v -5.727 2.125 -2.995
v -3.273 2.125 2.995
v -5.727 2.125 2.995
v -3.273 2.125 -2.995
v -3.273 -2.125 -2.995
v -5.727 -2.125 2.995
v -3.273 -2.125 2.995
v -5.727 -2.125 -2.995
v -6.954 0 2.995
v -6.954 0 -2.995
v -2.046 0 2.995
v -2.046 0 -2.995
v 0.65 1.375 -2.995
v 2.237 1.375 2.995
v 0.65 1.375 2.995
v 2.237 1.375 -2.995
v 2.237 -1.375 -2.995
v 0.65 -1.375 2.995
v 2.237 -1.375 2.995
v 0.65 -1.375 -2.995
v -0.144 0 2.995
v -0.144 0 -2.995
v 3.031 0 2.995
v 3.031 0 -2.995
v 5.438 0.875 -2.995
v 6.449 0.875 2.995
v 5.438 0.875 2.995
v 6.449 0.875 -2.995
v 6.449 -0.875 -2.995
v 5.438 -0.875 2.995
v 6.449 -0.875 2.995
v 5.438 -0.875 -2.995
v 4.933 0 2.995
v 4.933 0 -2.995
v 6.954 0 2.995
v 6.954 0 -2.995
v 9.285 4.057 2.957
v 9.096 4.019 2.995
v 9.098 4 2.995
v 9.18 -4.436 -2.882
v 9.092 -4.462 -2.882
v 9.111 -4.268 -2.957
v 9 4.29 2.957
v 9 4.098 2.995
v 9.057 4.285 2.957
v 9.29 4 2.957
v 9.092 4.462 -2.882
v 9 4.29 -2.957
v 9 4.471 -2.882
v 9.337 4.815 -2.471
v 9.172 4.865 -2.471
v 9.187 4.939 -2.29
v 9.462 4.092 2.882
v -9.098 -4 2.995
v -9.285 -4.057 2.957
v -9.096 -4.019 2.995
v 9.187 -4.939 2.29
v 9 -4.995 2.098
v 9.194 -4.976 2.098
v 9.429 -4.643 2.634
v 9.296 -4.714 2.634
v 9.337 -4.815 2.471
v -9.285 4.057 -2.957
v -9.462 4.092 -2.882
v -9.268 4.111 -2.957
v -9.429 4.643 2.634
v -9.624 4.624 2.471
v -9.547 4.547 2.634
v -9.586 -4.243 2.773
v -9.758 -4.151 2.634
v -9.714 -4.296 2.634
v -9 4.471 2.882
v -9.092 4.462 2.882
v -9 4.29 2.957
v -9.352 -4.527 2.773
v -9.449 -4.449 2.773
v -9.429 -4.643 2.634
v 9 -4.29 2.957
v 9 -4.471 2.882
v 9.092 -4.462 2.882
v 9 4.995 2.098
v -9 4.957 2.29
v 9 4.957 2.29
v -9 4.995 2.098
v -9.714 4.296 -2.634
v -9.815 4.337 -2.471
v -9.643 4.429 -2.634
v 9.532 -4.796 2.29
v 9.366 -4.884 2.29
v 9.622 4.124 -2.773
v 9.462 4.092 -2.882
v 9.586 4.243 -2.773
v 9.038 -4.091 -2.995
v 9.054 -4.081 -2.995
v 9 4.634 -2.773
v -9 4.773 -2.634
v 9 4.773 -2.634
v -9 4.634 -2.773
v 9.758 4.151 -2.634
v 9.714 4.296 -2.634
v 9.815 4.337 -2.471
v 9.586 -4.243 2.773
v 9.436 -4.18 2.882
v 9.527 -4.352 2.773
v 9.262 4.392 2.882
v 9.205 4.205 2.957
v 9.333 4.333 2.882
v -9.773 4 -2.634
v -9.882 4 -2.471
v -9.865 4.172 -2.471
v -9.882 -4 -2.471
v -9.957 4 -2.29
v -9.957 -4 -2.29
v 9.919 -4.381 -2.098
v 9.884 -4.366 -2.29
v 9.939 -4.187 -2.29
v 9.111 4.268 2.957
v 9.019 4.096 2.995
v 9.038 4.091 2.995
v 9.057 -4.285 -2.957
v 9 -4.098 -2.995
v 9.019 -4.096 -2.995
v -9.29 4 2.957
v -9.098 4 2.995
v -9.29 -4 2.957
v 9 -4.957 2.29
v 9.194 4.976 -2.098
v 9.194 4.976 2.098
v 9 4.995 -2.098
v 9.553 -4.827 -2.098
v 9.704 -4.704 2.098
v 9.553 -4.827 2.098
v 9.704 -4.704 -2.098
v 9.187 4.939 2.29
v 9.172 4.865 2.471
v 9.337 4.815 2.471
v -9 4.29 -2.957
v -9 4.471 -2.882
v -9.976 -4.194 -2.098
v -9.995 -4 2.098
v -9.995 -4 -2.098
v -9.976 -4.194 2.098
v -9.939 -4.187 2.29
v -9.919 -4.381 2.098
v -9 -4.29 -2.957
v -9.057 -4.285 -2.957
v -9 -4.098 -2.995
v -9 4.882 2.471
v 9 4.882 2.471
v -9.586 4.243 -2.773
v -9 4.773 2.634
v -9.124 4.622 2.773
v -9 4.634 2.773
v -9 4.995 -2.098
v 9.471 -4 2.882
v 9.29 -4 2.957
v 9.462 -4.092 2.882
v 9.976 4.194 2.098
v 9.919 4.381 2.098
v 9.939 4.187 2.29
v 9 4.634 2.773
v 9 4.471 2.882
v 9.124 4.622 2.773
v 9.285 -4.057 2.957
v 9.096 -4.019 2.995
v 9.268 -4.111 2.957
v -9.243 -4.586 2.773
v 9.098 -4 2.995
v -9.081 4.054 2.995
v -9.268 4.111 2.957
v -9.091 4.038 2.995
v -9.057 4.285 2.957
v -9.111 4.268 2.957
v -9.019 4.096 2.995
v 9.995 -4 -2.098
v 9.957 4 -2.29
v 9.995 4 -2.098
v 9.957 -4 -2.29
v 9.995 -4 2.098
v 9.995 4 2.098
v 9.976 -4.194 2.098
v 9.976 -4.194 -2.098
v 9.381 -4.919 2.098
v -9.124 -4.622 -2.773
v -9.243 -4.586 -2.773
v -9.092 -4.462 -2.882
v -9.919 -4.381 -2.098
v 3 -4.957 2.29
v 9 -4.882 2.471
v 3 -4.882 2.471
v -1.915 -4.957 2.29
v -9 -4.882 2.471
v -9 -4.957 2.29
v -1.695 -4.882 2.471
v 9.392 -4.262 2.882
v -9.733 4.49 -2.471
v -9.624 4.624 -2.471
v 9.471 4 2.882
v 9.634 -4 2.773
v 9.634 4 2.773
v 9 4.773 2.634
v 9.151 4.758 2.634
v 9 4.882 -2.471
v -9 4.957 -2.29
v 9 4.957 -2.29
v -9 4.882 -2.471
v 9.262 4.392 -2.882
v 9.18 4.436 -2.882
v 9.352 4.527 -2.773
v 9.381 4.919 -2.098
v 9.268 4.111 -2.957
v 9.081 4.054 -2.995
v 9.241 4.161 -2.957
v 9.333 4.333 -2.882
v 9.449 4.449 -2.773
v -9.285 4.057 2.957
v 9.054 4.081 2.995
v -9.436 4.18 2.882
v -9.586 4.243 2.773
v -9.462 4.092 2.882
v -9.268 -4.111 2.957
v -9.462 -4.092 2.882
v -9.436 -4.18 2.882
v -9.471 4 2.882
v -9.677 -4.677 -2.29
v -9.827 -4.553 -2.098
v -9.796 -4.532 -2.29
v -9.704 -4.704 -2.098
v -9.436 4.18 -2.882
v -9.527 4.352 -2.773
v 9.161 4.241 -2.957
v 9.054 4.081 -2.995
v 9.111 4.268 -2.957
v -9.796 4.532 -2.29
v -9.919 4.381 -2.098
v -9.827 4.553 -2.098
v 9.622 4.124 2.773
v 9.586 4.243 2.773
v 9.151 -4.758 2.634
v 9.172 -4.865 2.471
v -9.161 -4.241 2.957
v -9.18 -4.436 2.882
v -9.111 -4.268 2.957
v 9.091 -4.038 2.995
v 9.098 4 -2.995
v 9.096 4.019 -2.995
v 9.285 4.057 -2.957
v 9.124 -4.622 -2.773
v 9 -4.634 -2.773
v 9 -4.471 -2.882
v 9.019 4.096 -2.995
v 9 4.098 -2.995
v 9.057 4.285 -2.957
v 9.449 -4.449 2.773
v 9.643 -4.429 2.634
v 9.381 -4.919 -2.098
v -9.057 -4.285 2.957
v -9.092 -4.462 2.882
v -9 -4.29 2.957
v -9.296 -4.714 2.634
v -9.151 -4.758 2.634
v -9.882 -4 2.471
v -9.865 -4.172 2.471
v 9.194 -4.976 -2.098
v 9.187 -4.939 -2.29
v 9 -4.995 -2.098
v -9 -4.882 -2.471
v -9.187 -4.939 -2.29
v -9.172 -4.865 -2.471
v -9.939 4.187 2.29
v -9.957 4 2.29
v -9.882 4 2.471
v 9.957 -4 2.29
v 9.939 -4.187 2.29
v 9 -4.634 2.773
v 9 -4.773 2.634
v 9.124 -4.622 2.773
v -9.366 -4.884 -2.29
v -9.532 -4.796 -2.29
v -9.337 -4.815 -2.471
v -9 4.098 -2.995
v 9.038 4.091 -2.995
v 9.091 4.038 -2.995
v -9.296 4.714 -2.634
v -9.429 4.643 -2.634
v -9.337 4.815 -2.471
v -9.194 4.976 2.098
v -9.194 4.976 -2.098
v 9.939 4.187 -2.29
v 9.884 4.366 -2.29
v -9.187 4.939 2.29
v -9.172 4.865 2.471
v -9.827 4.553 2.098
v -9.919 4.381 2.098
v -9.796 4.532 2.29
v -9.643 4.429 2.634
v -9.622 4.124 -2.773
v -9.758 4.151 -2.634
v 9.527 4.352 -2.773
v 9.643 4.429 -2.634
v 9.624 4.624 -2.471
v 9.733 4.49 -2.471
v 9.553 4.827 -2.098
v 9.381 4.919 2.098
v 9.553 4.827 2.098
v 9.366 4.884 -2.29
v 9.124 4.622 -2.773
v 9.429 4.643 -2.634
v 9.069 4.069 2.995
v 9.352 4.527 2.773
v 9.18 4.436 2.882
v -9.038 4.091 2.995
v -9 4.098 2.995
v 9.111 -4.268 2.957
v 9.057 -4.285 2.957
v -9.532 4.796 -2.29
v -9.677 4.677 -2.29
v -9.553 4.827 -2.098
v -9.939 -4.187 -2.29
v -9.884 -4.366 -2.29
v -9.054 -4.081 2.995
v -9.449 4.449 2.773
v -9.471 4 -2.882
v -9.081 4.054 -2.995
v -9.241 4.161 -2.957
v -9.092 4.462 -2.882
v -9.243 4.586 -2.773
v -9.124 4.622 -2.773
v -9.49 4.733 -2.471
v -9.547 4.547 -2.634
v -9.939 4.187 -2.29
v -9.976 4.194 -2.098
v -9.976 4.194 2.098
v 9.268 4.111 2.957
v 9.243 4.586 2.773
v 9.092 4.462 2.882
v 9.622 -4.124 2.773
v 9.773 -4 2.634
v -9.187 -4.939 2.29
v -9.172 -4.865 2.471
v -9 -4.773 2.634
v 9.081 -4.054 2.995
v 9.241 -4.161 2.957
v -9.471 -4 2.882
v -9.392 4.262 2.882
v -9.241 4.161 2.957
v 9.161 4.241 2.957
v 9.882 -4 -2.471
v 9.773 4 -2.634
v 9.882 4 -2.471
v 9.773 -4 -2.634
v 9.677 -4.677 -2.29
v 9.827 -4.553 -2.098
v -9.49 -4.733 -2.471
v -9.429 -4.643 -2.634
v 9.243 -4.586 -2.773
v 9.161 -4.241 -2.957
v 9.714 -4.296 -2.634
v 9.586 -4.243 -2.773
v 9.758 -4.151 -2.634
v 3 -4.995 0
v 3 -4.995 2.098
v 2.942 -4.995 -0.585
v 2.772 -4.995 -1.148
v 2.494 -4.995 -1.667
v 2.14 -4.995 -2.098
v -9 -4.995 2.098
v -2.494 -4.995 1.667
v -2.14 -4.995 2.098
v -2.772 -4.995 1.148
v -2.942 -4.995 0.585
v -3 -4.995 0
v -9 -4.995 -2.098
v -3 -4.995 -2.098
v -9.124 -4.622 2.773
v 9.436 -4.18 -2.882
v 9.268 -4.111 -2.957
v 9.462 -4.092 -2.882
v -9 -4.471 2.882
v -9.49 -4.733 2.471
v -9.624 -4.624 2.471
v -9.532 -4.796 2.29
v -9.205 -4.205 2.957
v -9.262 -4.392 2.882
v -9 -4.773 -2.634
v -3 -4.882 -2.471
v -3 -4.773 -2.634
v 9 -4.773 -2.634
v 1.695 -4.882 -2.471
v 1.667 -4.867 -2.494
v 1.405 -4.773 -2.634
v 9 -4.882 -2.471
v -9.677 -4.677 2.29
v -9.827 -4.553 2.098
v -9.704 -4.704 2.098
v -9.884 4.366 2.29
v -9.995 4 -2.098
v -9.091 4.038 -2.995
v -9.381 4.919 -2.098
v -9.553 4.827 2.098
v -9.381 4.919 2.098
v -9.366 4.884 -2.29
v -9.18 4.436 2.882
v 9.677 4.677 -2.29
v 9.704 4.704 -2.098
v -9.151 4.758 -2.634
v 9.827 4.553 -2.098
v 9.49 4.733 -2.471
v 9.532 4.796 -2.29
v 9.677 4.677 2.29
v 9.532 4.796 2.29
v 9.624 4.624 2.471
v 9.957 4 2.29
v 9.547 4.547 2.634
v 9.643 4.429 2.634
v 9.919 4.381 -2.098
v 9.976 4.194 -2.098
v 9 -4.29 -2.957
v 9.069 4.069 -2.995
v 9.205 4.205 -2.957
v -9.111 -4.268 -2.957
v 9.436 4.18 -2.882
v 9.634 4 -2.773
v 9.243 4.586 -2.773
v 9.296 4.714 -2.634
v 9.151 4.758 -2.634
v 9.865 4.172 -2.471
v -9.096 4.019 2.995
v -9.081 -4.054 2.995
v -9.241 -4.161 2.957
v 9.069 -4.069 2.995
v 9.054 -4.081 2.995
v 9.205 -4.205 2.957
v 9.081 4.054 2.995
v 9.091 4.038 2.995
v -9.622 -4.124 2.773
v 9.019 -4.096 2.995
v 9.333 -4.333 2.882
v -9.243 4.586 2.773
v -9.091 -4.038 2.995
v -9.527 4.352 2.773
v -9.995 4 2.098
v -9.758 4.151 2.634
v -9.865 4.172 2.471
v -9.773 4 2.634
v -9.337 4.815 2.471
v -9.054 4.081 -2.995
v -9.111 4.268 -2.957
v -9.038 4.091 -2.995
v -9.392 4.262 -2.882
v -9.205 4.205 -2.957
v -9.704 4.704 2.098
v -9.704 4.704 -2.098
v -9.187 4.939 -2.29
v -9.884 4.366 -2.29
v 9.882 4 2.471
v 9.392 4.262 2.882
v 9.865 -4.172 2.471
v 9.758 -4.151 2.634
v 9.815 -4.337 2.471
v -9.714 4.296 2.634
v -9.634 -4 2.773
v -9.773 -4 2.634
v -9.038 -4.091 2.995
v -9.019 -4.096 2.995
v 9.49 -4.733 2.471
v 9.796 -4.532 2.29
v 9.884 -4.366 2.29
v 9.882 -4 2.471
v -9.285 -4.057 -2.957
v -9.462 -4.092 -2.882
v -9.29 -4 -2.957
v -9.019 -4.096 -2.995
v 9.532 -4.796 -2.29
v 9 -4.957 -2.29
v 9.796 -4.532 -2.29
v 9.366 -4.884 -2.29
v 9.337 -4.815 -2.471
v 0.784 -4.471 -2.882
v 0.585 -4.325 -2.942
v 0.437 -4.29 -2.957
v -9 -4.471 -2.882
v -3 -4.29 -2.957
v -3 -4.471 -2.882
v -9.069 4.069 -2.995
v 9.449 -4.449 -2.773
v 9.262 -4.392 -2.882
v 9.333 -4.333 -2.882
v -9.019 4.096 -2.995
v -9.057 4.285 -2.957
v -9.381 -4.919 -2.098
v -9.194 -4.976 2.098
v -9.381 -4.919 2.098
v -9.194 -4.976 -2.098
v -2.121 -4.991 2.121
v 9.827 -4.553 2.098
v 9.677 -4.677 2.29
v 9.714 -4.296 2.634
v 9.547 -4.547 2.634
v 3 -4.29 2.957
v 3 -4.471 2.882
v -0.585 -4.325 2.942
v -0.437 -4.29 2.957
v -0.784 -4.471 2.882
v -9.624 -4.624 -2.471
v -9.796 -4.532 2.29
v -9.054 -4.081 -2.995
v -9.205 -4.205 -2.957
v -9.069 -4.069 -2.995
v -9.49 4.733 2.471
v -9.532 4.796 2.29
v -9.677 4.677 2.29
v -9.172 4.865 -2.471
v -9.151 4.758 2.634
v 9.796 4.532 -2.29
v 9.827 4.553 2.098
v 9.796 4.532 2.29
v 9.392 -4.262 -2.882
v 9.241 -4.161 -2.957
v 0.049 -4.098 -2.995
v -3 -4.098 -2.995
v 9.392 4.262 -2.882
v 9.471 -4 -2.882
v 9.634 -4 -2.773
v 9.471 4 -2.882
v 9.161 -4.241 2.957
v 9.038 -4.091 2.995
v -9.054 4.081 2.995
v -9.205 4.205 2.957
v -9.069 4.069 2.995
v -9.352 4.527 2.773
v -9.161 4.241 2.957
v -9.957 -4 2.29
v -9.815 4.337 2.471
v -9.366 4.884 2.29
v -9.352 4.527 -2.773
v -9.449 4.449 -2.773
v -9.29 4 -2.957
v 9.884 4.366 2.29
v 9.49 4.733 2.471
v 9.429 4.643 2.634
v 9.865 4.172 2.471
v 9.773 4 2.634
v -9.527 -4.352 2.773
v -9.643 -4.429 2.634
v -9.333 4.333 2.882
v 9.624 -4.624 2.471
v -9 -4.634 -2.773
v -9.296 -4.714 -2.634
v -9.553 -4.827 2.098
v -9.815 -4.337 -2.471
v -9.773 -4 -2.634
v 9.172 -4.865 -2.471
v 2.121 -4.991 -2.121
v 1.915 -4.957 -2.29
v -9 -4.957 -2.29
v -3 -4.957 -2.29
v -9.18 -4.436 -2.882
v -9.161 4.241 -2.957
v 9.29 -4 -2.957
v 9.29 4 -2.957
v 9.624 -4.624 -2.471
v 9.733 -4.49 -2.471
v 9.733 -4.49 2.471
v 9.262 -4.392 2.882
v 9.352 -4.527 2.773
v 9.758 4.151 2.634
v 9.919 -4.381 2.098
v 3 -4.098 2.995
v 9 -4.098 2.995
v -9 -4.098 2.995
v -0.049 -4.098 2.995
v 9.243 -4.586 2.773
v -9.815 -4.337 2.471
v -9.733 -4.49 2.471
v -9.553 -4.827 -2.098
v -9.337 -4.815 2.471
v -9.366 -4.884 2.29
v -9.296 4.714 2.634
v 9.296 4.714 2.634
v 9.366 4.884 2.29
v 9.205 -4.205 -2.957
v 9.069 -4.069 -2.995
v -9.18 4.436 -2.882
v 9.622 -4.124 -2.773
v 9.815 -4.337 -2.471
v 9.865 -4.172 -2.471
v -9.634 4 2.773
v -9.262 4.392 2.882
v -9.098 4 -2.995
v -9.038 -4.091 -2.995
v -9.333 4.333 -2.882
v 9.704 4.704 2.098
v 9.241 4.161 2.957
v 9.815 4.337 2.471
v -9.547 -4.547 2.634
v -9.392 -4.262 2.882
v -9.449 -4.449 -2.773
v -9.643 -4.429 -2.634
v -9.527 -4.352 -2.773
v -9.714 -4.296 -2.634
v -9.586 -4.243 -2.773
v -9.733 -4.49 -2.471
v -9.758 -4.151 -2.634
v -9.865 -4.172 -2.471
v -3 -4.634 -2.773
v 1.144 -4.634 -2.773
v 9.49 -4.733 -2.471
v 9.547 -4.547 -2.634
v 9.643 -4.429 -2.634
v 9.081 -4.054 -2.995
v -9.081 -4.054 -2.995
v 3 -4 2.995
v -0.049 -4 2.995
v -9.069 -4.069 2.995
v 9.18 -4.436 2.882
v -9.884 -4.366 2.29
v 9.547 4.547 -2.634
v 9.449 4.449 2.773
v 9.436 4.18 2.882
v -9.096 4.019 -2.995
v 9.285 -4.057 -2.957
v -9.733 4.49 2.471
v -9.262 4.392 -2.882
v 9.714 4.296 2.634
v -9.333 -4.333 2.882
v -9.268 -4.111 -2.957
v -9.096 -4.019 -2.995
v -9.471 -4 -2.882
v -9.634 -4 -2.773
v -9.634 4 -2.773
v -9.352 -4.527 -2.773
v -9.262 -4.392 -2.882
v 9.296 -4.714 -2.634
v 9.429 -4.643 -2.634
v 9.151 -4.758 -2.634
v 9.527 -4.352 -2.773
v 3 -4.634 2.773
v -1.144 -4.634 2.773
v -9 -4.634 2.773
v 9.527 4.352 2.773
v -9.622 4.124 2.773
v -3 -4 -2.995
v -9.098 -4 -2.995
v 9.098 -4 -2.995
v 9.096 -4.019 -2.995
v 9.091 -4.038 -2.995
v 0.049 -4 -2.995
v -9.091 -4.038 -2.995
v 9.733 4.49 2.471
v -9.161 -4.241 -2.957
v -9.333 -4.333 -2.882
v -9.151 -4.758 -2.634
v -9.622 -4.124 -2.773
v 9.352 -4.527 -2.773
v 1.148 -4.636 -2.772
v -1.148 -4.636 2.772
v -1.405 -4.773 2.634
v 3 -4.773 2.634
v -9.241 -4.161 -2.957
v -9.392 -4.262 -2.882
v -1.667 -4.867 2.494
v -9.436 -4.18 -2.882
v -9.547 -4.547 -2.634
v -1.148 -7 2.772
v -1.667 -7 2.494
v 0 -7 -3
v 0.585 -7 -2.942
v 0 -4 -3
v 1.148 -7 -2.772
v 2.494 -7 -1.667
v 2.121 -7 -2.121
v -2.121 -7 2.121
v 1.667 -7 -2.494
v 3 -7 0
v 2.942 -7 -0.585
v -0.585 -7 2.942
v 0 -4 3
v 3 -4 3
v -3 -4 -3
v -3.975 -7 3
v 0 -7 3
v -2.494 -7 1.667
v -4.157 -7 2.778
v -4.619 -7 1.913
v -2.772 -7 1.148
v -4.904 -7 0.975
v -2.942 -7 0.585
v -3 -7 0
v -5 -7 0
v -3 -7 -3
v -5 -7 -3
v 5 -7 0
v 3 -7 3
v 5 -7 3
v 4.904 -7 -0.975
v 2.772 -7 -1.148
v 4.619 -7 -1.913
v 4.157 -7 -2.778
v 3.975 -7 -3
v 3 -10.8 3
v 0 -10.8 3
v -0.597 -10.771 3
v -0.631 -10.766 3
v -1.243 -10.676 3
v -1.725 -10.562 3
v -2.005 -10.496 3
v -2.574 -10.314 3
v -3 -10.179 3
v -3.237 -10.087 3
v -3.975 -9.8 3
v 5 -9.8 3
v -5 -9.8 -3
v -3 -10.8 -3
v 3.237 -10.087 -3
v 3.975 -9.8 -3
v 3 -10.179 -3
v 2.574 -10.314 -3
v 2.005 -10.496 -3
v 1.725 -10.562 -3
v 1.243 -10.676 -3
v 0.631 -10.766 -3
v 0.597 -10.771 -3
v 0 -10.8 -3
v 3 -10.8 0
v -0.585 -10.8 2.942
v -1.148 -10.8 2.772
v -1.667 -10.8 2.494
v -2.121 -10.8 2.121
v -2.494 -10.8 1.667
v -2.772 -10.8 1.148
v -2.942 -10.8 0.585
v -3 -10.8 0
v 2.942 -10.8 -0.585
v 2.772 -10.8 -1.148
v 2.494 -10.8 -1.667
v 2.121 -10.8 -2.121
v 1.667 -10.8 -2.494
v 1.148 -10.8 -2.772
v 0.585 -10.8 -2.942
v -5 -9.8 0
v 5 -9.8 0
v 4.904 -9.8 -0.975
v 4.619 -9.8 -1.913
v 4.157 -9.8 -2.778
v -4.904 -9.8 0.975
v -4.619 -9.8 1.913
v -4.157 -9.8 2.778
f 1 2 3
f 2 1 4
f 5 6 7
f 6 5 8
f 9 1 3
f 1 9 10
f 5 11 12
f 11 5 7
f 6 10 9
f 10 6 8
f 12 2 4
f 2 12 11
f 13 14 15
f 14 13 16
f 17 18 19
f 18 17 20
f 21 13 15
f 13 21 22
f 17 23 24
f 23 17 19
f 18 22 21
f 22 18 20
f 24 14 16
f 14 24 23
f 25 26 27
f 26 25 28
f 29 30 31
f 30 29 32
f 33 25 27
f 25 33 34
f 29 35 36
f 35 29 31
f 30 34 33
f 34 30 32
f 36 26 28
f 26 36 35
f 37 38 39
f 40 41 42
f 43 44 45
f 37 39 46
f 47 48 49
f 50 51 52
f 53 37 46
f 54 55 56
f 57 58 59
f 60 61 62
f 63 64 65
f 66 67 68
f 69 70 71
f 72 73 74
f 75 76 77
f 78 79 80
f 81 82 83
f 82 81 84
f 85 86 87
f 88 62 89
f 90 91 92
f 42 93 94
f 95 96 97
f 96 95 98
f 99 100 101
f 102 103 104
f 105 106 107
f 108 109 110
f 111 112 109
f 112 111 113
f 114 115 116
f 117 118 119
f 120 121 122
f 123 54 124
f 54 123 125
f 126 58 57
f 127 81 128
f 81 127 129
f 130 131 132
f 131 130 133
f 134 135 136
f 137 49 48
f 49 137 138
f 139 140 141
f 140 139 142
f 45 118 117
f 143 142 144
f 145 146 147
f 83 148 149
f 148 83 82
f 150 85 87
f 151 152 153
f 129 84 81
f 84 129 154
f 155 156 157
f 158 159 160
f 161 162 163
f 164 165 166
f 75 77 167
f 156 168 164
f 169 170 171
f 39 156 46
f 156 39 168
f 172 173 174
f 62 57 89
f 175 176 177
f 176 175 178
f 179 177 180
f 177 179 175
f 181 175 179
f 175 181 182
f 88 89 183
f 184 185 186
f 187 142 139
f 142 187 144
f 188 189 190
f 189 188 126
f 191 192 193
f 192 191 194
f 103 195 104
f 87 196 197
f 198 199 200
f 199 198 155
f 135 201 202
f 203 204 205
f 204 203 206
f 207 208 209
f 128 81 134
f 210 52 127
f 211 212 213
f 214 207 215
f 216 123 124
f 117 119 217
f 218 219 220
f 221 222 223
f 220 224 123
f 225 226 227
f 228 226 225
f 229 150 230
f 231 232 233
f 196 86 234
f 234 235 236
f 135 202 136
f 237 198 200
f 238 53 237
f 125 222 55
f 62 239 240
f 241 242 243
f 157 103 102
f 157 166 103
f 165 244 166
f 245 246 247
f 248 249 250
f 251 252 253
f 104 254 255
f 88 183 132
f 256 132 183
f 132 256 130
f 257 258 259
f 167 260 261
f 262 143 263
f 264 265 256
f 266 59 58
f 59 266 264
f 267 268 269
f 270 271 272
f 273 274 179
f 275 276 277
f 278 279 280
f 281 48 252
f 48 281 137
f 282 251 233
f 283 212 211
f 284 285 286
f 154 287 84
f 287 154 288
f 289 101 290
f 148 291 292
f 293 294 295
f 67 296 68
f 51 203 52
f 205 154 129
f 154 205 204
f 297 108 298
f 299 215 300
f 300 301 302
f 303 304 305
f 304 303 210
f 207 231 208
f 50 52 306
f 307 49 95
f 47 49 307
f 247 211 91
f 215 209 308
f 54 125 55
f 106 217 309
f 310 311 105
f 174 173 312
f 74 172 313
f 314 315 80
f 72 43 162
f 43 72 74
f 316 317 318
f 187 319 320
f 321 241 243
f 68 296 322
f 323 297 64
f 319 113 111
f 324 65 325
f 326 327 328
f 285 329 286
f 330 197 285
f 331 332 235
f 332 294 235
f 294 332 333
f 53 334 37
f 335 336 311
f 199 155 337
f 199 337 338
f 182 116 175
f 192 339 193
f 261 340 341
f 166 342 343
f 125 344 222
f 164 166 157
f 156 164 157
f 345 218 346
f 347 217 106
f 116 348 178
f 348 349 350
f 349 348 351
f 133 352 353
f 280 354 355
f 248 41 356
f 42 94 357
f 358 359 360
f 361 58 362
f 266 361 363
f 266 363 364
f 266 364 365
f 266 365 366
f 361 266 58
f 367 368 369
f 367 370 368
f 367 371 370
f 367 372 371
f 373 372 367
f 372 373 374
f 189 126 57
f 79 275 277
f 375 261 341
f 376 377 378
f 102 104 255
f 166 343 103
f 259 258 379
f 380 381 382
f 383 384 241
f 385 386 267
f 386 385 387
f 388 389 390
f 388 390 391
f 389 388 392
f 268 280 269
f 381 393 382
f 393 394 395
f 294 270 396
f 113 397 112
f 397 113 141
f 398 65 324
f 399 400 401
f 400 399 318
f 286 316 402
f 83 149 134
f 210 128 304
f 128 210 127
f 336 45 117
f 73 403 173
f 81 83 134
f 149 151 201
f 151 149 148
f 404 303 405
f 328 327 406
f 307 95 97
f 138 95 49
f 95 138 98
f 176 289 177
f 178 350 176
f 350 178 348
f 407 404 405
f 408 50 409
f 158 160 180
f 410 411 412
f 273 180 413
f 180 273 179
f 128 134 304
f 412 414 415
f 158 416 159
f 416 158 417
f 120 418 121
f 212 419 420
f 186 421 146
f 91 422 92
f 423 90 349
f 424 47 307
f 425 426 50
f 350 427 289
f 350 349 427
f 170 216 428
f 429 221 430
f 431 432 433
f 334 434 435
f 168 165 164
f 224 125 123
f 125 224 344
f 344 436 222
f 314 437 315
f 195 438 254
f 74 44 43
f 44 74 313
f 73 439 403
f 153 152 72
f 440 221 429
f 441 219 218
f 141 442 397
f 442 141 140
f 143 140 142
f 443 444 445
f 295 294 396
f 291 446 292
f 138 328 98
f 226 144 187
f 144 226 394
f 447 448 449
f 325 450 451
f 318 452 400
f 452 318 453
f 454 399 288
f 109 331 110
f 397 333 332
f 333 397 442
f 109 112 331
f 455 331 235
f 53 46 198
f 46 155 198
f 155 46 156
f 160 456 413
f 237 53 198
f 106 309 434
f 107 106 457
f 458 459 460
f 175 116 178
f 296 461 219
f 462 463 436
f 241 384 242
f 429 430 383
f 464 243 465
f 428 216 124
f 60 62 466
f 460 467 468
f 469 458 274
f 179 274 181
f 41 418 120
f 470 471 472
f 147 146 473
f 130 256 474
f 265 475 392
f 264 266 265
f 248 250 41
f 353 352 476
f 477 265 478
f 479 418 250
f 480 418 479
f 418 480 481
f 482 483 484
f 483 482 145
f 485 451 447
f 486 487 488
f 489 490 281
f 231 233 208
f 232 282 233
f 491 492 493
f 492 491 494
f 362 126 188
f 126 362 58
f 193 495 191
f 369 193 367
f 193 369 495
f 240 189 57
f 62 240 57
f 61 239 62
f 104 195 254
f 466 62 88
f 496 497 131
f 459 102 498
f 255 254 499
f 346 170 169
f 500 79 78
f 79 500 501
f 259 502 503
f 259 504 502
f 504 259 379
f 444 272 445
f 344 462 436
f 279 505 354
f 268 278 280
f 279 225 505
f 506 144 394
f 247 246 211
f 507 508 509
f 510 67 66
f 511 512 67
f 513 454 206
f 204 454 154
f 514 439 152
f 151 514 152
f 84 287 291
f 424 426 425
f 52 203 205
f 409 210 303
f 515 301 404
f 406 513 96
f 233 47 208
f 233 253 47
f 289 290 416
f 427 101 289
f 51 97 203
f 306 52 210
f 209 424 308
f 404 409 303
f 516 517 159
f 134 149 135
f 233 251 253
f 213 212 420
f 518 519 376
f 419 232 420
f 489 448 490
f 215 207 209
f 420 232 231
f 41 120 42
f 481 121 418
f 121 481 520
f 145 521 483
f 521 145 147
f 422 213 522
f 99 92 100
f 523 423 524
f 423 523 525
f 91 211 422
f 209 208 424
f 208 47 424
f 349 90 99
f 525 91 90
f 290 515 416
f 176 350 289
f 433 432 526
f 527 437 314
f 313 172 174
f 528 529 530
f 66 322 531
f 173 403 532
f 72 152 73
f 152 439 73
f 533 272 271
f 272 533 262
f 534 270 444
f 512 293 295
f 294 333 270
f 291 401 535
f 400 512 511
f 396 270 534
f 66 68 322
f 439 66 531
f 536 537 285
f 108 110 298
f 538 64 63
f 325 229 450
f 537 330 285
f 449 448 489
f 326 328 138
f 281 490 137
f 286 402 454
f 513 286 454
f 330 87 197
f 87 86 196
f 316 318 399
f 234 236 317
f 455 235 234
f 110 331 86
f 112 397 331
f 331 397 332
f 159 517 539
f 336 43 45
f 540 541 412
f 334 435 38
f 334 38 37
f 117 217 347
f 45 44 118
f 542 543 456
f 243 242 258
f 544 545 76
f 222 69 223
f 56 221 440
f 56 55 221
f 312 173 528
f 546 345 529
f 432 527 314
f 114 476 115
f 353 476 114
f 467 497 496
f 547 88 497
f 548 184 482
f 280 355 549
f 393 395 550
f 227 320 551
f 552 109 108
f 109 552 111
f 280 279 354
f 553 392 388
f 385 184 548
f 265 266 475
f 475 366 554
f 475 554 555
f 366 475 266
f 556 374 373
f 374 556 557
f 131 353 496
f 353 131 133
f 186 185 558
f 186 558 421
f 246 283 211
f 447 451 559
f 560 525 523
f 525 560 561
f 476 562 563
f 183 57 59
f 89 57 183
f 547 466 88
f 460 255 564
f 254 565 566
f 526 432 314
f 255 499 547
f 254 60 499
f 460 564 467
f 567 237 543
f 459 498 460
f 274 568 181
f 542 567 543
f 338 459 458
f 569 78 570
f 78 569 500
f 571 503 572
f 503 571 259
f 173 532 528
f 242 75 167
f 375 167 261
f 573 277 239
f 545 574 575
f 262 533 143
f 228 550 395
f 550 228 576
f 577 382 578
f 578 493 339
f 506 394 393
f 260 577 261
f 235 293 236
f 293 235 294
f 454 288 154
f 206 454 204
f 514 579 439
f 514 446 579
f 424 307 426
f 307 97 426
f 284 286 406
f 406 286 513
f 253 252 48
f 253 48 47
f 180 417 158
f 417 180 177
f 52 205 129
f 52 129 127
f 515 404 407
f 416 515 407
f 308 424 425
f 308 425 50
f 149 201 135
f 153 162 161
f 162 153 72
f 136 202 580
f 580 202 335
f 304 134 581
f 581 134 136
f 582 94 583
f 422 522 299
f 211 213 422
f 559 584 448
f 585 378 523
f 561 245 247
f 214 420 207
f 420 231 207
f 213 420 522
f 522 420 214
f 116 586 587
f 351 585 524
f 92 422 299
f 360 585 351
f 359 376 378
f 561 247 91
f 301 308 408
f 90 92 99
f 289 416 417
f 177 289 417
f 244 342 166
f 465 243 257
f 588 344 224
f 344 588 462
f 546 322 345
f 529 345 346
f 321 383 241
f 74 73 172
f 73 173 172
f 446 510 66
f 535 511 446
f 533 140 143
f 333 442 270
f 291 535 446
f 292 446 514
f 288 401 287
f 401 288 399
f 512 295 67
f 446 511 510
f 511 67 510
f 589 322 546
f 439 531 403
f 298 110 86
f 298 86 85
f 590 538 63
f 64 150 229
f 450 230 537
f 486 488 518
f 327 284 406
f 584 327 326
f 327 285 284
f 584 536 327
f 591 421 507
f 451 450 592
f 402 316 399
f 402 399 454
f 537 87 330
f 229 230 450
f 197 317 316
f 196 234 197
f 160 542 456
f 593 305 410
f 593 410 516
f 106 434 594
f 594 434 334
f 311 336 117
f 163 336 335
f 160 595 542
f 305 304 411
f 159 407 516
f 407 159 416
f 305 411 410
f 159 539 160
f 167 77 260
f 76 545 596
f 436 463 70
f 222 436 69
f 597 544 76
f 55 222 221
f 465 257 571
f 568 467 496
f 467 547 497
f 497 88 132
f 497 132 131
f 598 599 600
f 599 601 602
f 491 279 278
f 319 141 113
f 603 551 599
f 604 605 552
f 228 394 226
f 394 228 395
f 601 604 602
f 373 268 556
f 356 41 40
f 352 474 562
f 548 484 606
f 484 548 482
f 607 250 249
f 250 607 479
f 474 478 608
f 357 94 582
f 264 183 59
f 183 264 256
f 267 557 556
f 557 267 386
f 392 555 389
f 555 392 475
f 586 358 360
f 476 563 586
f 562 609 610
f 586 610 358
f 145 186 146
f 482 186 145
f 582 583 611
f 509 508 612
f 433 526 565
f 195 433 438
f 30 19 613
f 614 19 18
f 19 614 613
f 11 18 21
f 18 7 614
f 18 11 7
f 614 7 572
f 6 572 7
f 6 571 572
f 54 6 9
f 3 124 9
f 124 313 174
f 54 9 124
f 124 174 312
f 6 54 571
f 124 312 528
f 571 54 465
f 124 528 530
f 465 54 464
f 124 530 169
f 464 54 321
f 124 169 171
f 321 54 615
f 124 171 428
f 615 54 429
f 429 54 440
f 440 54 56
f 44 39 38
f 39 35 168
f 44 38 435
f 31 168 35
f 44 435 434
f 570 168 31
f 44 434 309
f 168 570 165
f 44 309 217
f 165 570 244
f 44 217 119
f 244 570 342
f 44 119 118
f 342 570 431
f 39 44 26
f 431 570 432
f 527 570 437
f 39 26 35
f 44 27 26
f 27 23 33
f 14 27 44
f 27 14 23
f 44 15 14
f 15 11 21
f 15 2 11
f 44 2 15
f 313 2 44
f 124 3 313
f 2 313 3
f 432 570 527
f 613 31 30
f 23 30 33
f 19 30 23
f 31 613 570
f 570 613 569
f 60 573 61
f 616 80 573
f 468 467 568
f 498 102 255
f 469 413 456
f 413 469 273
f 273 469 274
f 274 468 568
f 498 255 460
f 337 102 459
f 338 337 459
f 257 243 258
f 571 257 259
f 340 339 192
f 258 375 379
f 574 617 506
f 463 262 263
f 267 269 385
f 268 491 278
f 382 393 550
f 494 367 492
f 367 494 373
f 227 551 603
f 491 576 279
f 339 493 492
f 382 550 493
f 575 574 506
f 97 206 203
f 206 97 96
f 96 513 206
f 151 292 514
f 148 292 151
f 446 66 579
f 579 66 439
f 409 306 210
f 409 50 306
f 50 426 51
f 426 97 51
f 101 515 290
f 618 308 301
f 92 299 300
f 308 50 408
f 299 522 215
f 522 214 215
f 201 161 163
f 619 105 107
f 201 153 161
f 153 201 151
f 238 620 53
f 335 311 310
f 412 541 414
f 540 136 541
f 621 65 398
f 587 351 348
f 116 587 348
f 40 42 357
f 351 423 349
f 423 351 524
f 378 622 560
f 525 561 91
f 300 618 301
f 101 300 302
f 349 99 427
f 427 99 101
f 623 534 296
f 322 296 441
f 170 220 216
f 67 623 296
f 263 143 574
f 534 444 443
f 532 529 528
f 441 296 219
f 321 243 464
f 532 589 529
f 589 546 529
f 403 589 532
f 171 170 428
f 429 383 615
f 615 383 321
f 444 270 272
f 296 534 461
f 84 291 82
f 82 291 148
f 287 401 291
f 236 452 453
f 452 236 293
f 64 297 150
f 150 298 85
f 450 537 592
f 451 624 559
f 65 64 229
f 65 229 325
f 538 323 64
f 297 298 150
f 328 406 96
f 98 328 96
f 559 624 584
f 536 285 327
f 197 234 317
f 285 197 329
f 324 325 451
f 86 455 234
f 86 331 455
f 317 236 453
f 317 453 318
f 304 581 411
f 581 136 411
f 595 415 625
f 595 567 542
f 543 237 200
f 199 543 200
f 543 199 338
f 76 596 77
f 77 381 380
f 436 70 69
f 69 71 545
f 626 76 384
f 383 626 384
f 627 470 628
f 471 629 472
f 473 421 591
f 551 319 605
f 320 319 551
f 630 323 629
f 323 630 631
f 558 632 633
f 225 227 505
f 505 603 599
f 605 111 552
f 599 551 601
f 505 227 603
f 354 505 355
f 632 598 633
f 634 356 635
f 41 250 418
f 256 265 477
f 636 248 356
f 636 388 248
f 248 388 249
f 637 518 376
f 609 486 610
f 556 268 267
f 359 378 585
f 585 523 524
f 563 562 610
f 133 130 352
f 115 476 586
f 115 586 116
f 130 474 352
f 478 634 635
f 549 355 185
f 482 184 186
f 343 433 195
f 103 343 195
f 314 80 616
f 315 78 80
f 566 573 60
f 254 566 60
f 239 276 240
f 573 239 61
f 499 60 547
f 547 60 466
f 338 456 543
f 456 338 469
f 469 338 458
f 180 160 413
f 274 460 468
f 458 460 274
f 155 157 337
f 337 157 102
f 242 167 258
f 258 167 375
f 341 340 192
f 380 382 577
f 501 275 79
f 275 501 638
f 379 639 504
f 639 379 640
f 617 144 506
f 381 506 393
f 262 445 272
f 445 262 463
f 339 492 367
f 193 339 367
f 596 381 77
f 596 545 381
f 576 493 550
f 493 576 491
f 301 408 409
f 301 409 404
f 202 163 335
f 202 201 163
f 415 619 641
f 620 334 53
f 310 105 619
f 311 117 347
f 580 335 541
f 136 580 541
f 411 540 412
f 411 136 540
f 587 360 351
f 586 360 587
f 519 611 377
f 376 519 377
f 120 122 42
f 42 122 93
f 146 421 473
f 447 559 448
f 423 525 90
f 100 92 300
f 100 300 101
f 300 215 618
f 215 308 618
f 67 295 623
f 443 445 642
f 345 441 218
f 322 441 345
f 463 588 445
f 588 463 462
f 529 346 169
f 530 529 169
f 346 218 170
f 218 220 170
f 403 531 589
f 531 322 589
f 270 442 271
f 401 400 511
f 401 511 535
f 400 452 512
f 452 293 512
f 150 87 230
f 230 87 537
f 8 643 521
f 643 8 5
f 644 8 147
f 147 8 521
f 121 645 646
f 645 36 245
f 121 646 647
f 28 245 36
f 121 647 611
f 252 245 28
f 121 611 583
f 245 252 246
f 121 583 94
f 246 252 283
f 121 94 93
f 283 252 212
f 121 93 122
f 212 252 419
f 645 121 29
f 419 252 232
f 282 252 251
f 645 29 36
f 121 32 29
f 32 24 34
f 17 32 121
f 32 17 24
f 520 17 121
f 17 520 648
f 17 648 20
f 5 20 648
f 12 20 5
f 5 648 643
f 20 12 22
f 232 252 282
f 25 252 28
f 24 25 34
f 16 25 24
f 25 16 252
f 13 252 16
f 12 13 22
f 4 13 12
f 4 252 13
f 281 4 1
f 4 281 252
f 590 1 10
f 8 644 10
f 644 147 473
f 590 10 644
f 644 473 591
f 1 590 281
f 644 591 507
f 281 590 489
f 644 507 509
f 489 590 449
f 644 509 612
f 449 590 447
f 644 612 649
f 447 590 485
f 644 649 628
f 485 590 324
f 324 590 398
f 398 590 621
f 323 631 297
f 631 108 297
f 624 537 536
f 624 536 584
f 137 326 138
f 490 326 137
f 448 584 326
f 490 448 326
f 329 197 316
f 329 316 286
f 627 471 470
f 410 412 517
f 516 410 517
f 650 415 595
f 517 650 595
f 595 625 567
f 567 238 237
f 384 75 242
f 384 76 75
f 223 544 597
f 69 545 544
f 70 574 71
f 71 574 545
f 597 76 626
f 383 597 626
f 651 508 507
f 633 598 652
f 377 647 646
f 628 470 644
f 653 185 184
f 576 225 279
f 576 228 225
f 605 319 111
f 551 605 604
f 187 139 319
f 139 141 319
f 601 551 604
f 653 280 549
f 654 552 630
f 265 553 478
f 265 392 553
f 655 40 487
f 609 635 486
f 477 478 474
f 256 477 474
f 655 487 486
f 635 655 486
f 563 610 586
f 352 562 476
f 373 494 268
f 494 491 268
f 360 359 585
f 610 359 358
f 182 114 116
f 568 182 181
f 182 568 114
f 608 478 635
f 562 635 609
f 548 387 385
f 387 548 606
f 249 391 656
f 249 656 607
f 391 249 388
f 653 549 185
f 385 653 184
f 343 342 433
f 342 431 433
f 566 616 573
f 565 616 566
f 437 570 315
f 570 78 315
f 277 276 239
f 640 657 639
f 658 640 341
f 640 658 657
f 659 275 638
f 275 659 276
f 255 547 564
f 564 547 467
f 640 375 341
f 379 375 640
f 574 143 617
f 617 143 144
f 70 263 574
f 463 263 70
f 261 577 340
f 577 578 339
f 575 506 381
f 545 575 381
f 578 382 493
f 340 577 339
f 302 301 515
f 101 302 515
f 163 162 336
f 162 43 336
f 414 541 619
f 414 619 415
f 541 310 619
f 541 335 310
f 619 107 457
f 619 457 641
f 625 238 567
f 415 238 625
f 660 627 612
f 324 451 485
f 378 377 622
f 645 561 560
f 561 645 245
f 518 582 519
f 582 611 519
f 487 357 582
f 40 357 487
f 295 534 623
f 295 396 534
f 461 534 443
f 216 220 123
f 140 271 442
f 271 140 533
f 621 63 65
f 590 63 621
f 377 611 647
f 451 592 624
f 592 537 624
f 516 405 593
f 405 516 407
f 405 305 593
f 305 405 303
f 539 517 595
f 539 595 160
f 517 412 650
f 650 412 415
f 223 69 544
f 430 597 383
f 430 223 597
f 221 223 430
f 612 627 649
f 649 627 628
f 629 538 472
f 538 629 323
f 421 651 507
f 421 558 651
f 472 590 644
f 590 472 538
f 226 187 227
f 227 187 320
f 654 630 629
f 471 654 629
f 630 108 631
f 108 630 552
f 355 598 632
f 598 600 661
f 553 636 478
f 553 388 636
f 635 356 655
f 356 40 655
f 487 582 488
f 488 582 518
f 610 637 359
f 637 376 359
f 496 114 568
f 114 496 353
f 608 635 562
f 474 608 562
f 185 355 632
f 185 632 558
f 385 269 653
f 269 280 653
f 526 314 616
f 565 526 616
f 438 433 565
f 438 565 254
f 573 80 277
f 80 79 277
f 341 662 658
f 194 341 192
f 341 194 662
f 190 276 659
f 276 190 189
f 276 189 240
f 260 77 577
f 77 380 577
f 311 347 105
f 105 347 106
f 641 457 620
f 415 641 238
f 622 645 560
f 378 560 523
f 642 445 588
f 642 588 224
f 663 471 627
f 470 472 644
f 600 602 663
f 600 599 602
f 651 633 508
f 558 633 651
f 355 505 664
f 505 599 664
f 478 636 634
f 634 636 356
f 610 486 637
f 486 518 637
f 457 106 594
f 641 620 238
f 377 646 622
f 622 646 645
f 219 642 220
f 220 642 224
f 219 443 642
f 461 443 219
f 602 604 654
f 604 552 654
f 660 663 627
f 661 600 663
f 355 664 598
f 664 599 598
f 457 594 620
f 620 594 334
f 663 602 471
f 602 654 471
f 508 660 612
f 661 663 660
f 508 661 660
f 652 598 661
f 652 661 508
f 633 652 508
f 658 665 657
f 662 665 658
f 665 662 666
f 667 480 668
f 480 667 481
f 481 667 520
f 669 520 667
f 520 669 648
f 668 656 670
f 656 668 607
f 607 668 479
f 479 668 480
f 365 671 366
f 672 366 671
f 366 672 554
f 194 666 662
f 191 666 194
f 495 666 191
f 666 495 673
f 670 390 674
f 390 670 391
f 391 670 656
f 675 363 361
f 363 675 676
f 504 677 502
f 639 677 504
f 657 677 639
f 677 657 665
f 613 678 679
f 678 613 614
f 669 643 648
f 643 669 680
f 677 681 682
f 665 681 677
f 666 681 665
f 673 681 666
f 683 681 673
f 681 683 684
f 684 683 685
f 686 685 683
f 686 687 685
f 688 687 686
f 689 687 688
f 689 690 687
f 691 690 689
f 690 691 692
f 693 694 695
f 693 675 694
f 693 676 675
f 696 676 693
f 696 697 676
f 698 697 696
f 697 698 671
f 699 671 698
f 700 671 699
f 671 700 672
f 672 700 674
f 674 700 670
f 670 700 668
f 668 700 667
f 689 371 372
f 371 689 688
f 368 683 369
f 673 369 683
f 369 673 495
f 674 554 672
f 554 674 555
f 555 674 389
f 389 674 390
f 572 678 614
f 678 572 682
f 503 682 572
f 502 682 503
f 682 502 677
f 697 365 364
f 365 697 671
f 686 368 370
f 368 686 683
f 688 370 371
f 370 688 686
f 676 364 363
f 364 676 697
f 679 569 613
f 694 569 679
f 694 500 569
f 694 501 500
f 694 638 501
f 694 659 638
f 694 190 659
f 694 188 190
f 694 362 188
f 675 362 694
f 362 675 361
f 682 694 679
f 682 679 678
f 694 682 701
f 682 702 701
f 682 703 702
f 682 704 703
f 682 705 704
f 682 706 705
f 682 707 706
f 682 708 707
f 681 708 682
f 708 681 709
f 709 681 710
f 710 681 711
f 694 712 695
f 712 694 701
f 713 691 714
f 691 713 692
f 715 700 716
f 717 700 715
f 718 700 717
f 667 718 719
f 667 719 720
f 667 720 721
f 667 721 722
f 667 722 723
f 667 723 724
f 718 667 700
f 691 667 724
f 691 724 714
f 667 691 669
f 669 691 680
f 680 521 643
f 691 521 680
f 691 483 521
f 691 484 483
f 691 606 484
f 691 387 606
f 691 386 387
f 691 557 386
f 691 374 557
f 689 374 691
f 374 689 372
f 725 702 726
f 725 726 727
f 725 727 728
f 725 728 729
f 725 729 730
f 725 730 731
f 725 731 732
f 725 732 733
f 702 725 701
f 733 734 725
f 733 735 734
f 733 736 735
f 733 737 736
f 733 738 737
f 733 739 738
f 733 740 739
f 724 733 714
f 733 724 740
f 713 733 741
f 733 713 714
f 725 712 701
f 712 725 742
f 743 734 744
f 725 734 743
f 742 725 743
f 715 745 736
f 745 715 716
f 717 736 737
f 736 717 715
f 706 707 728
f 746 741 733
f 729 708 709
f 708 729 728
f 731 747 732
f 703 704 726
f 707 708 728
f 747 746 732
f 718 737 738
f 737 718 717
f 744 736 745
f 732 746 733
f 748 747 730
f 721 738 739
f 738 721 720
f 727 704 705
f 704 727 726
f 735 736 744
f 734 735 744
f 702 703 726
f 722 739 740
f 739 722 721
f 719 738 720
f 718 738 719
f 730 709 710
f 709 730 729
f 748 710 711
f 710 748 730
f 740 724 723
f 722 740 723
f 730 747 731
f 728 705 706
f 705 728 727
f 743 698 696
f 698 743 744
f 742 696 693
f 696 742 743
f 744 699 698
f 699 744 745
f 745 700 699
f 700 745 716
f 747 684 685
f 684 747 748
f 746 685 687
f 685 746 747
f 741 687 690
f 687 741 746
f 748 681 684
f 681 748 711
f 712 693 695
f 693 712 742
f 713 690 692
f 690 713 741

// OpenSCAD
// Customizable hex key holder

// diameter for key #1
hex1 = 4; // [1.5:0.5:5]

// diameter for key #2 
hex2 = 2.5; //[1.5:0.5:5]

// diameter for key #3
hex3 = 1.5; //[1.5:0.5:5]

// tolerance for the print
tolerance = 0.25;

/*[Hidden]*/
$fn=32;


// Lets build it
block();

module hexHole(h){
    h = h+tolerance;
    face = (h)/sqrt(3);
    
    color("red")
    union(){
        cube([h/sqrt(3),h,8], center = true);
        rotate(60) cube([face,h,8], center = true);
        rotate(120) cube([face,h,8], center = true);
    }
}

function d(h=5) = 2*h/sqrt(3);

module hexHoles(){
    space = (18-d(hex1)-d(hex2)-d(hex3))/4;

    translate([-9+space+d(hex1)/2,0,0])
    hexHole(hex1);

    translate([-9+2*space+d(hex1)+d(hex2)/2,0,0])
    hexHole(hex2);

    translate([-9+3*space+d(hex1)+d(hex2)+d(hex3)/2,0,0])
    hexHole(hex3);
}


module block(){
    union(){
        // BODY
        difference(){
            minkowski(){
                sphere(1);
                
                translate([0,0,0])
                cube([18,8,4], center = true);
            }
            
            hexHoles();
        }
        // NECK
        union(){
            translate([0,-5.5,0]) 
            rotate([90,0,0]) 
            cylinder(h=3, r=3, center=true);
            
            translate([0,-7,0]) 
            cube([3, 3,3], center = false);

            translate([-3,-7,-3]) 
            cube([3,3,3], center = false);

        }
        // HEAD
        intersection(){
            union(){
                translate([0,-9.8,0]) 
                rotate([-90,0,0]) 
                cylinder(h=2.8, r=5, center=false);
                
                translate([0,-9.8,0]) 
                cube([5, 2.8,5], center = false);

                translate([-5,-9.8,-5])  
                cube([5, 2.8,5], center = false);
                
                union(){
                    intersection(){
                        translate([0,-9.8,0])
                        rotate([90,0,0])
                        linear_extrude(height = 1, scale = 0.6)
                        square([10, 10], center = true);
                        
                        union(){
                            translate([0,-10.8,0])
                            cube([5, 1,5], center=false);
                            
                            translate([-5,-10.8,-5])
                            cube([5,1,5], center=false);
                        }
                    }
                    translate([0,-9.8,0])
                    rotate([90,0,0])
                    linear_extrude(height = 1, scale = 0.6)
                    circle(5, center = true);
                }
            }

            translate([-5,-10.8,-3])
            cube([10,3.8,6], center = false);
        }
    }
}
echo(version=version());
